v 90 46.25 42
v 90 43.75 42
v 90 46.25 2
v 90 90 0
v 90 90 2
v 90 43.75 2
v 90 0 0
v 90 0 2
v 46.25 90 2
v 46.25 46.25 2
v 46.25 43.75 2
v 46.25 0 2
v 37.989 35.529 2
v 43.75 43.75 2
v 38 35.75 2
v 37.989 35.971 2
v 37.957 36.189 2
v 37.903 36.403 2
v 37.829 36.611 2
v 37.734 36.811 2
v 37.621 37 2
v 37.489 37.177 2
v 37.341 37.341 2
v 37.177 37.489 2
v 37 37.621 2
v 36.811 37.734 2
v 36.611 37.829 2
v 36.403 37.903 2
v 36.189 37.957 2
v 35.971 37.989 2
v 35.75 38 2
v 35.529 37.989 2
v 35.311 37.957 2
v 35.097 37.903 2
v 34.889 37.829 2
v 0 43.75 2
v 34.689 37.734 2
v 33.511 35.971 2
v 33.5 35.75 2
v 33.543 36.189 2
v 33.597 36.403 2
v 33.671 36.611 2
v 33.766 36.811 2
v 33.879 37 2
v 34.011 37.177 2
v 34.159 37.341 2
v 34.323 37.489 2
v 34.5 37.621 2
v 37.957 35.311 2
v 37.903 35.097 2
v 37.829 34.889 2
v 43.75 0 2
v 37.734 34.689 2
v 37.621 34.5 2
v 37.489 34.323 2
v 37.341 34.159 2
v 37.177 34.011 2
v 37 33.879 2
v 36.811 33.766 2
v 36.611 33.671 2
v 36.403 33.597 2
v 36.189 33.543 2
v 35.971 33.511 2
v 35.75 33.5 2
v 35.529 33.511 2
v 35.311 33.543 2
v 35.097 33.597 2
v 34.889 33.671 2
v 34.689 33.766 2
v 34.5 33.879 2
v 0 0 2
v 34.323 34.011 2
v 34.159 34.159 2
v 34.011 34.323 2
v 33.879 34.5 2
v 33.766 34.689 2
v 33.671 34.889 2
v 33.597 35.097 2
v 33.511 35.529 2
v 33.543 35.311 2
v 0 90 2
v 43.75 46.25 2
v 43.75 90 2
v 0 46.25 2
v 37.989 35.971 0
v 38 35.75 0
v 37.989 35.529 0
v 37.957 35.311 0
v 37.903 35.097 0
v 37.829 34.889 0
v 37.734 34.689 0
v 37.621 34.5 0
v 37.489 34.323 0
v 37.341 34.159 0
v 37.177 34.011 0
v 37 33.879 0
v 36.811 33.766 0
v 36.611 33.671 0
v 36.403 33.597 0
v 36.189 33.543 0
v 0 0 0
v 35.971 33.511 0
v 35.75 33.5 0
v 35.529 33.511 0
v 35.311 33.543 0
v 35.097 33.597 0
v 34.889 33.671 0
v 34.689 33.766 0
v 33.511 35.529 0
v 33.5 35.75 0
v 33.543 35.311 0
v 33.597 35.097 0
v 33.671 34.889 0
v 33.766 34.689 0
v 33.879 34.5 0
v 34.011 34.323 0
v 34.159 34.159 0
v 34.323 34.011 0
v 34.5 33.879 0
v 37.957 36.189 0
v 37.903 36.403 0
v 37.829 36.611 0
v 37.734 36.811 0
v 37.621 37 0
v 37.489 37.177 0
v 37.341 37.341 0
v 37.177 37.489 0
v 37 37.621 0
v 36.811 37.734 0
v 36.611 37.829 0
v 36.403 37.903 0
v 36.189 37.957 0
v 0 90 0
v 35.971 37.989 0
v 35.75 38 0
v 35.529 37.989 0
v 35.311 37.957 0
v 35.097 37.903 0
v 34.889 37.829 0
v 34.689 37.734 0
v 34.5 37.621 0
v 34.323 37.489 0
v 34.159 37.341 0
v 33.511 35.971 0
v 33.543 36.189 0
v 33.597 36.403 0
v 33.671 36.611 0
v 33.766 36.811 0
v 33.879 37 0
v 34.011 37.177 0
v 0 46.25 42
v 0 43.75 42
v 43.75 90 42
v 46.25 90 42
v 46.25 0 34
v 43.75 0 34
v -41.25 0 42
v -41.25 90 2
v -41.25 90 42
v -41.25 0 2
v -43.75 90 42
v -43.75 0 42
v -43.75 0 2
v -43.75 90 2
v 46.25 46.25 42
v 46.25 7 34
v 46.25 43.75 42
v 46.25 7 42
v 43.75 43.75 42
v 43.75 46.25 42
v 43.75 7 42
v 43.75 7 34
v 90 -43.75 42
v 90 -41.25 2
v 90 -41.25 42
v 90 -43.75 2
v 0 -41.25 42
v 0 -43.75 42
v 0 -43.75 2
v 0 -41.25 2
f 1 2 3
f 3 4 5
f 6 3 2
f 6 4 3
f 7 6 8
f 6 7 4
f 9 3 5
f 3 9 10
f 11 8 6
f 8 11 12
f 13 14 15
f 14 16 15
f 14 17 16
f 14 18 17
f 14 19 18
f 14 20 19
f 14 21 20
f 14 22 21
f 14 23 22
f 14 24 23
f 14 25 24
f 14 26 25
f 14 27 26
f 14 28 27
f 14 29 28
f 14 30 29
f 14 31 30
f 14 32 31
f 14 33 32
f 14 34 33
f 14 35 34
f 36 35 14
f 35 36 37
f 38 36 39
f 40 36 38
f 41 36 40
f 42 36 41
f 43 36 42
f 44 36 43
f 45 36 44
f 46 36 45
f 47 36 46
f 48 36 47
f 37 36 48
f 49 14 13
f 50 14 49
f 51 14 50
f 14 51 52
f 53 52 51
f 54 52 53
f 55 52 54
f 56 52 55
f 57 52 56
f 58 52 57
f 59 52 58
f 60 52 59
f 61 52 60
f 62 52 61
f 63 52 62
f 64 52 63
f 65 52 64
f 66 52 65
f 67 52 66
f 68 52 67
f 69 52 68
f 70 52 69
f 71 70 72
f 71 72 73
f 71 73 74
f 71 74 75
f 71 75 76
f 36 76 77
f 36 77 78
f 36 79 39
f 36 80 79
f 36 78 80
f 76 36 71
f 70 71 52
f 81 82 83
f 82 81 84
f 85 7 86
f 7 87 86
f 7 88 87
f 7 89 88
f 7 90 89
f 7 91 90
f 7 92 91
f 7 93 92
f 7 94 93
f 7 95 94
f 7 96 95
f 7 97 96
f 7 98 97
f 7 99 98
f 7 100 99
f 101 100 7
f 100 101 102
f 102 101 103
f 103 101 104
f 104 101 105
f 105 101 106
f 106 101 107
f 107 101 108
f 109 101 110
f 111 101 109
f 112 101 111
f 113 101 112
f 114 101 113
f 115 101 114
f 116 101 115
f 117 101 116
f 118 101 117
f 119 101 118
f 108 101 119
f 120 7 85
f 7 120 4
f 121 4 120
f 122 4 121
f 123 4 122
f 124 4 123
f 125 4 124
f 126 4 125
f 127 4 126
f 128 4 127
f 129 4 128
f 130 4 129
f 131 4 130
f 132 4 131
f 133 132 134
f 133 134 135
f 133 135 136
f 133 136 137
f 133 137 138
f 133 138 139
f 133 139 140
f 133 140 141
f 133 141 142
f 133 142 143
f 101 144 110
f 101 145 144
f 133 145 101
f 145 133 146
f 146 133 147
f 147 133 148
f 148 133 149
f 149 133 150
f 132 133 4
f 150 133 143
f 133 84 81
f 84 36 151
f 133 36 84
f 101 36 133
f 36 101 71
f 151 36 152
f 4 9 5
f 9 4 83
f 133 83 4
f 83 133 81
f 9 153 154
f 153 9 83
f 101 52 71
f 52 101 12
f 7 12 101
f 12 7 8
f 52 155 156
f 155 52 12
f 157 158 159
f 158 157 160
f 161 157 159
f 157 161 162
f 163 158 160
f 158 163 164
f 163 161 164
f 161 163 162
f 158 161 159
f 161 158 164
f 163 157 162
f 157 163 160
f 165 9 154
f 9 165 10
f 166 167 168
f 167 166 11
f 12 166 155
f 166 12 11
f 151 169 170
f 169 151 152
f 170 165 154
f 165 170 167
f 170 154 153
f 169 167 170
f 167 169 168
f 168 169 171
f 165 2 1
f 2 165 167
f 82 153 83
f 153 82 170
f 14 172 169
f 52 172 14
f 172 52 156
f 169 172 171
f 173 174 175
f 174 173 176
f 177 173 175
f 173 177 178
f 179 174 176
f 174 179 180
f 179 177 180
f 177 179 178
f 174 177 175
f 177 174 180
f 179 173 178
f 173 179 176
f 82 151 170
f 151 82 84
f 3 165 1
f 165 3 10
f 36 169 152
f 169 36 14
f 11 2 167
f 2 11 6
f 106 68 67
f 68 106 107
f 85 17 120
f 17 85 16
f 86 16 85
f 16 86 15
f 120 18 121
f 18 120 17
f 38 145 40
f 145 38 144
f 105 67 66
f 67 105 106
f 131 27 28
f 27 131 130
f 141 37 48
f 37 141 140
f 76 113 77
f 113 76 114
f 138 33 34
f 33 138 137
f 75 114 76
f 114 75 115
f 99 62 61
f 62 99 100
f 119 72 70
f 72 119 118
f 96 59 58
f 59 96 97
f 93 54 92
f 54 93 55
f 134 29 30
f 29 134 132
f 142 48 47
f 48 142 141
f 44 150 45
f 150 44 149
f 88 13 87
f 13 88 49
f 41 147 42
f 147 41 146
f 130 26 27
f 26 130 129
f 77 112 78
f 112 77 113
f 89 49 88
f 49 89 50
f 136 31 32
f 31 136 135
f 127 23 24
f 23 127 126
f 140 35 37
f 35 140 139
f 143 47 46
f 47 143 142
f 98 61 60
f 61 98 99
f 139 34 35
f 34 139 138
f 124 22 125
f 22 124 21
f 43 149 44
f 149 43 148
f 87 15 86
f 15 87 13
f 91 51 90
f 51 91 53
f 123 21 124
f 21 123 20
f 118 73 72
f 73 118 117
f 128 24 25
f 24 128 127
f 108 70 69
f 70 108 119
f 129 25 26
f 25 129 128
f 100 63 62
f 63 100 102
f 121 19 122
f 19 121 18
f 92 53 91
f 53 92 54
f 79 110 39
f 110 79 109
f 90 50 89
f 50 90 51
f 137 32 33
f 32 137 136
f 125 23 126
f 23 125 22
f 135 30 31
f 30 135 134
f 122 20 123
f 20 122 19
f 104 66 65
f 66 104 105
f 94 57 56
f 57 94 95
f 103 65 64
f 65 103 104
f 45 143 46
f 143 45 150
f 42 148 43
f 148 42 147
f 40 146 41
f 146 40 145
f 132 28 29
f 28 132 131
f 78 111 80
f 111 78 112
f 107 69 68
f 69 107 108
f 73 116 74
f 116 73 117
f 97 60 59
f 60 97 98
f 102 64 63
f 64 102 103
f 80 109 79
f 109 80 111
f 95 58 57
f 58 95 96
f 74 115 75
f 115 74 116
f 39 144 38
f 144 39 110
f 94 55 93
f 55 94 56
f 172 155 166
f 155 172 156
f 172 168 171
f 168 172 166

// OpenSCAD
// --- Dimensions in Millimeters ---

// Overall housing dimensions
outer_x = 90;    // Outer width of the box (X)
outer_y = 90;    // Outer depth of the box (Y)
top_plate_thickness = 2; // Thickness of the top plate (Z from 0 to 2)
wall_height = 40; // Height of the walls above the top plate (Total height is 42mm, but wall rises to Z=40)
wall_thickness = 2.5; // Thickness of the four side walls

// Screw hole dimensions
screw_hole_diameter = 4.5; // Diameter for M4 screw holes
screw_pattern_size = 71.5; // Side length of the square pattern for mounting holes

// Cable notch dimensions (on one wall)
notch_width = 12;      // Width of the cable notch (span along Y axis, matching report's implied dimension)
notch_depth = 8;       // Depth of the cable notch from the open edge (Z=40 down to Z=32)

// Rendering settings
$fn = 64;

// --- Module Definitions ---

// Function to create a rectangular prism centered at origin
module box(x, y, z) {
    cube([x, y, z]);
}

// --- Main Assembly ---

difference() {
    // 1. The main outer shell structure (Union of top plate and walls)

    union() {
        // A. Top Plate (Lies on Z=0 plane, thickness = 2mm)
        translate([0, 0, 0]) {
            box(outer_x, outer_y, top_plate_thickness);
        }

        // B. Walls (Four vertical walls rising from the top plate)
        inner_x = outer_x - 2 * wall_thickness;
        inner_y = outer_y - 2 * wall_thickness;

        // Wall 1: Front (Parallel to Y-axis, centered in X)
        translate([-(outer_x/2) + wall_thickness/2, 0, top_plate_thickness]) {
            box(wall_thickness, outer_y, wall_height);
        }

        // Wall 2: Back (Parallel to Y-axis, centered in X)
        translate([(outer_x/2) - wall_thickness/2, 0, top_plate_thickness]) {
            box(wall_thickness, outer_y, wall_height);
        }

        // Wall 3: Left (Parallel to X-axis, centered in Y)
        translate([0, -(outer_y/2) + wall_thickness/2, top_plate_thickness]) {
            box(outer_x, wall_thickness, wall_height);
        }

        // Wall 4: Right (Parallel to X-axis, centered in Y)
        translate([0, (outer_y/2) - wall_thickness/2, top_plate_thickness]) {
            box(outer_x, wall_thickness, wall_height);
        }
    }

    // 2. Cutouts (Subtractions)

    // A. Screw Holes in the Top Plate (Z=0 to Z=2)
    for (i = [-1, 1]) { // X positions relative to center
        for (j = [-1, 1]) { // Y positions relative to center
            translate([
                (screw_pattern_size/2) * i,
                (screw_pattern_size/2) * j,
                -0.1 // Start slightly below Z=0 for clean cut
            ]) {
                cylinder(h = top_plate_thickness + 0.2, r = screw_hole_diameter / 2);
            }
        }
    }

    // B. Cable Notch in one wall (Right Wall: X > outer_x/2 - wall_thickness/2)
    right_wall_center_x = (outer_x / 2) - (wall_thickness / 2);

    translate([
        right_wall_center_x, // Position along X axis of the right wall
        0,                    // Centered in Y for simplicity
        top_plate_thickness  // Start cutting from the top surface (Z=2) downwards
    ]) {
        // The notch is 12mm wide (span along Y axis), and reaches 8mm down from Z=40.
        notch_span_y = notch_width; // 12mm span in Y

        // To match the report's implied geometry, we must ensure the cut only affects the wall structure itself.
        // The right wall is defined by X being near outer_x/2 and spanning Y across its thickness.
        // We cut a slot of width=12mm (Y span) and depth=8mm (Z range 32 to 40).

        // Since the notch must be centered along the wall, we center it in Y relative to the full outer dimension, but constrained by the wall thickness.
        // The wall spans from -(outer_y/2 - wall_thickness/2) to (outer_y/2 - wall_thickness/2).
        // We center the 12mm notch span around Y=0 for simplicity and symmetry in the cut, as done previously.

        translate([0, -notch_span_y/2, 32]) { // Start cutting at Z=32 (8mm down from Z=40)
            // The cutter must be wide enough to pass through the wall thickness (which is 2.5mm).
            // We use a small X dimension for the cut since we are only cutting into the face of the right wall, not completely through it in X direction relative to the center line.
            box(wall_thickness + 1, notch_span_y + 1, 8); // Cut depth is 8mm (Z=32 to Z=40)
        }
    }
}
